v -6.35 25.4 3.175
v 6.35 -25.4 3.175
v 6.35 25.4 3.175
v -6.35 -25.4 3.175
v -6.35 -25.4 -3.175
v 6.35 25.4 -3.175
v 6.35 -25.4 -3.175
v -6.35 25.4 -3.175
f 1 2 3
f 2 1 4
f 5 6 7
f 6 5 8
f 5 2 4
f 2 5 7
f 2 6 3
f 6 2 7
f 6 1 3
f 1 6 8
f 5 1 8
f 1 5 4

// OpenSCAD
// ========================================
// a 0.5 by 2 by 0.25 inch box
// NeuroCAD canonical IR; dimensions are millimetres
// ========================================
$fn = 48;

cube(size=[12.7, 50.8, 6.35], center=true);
